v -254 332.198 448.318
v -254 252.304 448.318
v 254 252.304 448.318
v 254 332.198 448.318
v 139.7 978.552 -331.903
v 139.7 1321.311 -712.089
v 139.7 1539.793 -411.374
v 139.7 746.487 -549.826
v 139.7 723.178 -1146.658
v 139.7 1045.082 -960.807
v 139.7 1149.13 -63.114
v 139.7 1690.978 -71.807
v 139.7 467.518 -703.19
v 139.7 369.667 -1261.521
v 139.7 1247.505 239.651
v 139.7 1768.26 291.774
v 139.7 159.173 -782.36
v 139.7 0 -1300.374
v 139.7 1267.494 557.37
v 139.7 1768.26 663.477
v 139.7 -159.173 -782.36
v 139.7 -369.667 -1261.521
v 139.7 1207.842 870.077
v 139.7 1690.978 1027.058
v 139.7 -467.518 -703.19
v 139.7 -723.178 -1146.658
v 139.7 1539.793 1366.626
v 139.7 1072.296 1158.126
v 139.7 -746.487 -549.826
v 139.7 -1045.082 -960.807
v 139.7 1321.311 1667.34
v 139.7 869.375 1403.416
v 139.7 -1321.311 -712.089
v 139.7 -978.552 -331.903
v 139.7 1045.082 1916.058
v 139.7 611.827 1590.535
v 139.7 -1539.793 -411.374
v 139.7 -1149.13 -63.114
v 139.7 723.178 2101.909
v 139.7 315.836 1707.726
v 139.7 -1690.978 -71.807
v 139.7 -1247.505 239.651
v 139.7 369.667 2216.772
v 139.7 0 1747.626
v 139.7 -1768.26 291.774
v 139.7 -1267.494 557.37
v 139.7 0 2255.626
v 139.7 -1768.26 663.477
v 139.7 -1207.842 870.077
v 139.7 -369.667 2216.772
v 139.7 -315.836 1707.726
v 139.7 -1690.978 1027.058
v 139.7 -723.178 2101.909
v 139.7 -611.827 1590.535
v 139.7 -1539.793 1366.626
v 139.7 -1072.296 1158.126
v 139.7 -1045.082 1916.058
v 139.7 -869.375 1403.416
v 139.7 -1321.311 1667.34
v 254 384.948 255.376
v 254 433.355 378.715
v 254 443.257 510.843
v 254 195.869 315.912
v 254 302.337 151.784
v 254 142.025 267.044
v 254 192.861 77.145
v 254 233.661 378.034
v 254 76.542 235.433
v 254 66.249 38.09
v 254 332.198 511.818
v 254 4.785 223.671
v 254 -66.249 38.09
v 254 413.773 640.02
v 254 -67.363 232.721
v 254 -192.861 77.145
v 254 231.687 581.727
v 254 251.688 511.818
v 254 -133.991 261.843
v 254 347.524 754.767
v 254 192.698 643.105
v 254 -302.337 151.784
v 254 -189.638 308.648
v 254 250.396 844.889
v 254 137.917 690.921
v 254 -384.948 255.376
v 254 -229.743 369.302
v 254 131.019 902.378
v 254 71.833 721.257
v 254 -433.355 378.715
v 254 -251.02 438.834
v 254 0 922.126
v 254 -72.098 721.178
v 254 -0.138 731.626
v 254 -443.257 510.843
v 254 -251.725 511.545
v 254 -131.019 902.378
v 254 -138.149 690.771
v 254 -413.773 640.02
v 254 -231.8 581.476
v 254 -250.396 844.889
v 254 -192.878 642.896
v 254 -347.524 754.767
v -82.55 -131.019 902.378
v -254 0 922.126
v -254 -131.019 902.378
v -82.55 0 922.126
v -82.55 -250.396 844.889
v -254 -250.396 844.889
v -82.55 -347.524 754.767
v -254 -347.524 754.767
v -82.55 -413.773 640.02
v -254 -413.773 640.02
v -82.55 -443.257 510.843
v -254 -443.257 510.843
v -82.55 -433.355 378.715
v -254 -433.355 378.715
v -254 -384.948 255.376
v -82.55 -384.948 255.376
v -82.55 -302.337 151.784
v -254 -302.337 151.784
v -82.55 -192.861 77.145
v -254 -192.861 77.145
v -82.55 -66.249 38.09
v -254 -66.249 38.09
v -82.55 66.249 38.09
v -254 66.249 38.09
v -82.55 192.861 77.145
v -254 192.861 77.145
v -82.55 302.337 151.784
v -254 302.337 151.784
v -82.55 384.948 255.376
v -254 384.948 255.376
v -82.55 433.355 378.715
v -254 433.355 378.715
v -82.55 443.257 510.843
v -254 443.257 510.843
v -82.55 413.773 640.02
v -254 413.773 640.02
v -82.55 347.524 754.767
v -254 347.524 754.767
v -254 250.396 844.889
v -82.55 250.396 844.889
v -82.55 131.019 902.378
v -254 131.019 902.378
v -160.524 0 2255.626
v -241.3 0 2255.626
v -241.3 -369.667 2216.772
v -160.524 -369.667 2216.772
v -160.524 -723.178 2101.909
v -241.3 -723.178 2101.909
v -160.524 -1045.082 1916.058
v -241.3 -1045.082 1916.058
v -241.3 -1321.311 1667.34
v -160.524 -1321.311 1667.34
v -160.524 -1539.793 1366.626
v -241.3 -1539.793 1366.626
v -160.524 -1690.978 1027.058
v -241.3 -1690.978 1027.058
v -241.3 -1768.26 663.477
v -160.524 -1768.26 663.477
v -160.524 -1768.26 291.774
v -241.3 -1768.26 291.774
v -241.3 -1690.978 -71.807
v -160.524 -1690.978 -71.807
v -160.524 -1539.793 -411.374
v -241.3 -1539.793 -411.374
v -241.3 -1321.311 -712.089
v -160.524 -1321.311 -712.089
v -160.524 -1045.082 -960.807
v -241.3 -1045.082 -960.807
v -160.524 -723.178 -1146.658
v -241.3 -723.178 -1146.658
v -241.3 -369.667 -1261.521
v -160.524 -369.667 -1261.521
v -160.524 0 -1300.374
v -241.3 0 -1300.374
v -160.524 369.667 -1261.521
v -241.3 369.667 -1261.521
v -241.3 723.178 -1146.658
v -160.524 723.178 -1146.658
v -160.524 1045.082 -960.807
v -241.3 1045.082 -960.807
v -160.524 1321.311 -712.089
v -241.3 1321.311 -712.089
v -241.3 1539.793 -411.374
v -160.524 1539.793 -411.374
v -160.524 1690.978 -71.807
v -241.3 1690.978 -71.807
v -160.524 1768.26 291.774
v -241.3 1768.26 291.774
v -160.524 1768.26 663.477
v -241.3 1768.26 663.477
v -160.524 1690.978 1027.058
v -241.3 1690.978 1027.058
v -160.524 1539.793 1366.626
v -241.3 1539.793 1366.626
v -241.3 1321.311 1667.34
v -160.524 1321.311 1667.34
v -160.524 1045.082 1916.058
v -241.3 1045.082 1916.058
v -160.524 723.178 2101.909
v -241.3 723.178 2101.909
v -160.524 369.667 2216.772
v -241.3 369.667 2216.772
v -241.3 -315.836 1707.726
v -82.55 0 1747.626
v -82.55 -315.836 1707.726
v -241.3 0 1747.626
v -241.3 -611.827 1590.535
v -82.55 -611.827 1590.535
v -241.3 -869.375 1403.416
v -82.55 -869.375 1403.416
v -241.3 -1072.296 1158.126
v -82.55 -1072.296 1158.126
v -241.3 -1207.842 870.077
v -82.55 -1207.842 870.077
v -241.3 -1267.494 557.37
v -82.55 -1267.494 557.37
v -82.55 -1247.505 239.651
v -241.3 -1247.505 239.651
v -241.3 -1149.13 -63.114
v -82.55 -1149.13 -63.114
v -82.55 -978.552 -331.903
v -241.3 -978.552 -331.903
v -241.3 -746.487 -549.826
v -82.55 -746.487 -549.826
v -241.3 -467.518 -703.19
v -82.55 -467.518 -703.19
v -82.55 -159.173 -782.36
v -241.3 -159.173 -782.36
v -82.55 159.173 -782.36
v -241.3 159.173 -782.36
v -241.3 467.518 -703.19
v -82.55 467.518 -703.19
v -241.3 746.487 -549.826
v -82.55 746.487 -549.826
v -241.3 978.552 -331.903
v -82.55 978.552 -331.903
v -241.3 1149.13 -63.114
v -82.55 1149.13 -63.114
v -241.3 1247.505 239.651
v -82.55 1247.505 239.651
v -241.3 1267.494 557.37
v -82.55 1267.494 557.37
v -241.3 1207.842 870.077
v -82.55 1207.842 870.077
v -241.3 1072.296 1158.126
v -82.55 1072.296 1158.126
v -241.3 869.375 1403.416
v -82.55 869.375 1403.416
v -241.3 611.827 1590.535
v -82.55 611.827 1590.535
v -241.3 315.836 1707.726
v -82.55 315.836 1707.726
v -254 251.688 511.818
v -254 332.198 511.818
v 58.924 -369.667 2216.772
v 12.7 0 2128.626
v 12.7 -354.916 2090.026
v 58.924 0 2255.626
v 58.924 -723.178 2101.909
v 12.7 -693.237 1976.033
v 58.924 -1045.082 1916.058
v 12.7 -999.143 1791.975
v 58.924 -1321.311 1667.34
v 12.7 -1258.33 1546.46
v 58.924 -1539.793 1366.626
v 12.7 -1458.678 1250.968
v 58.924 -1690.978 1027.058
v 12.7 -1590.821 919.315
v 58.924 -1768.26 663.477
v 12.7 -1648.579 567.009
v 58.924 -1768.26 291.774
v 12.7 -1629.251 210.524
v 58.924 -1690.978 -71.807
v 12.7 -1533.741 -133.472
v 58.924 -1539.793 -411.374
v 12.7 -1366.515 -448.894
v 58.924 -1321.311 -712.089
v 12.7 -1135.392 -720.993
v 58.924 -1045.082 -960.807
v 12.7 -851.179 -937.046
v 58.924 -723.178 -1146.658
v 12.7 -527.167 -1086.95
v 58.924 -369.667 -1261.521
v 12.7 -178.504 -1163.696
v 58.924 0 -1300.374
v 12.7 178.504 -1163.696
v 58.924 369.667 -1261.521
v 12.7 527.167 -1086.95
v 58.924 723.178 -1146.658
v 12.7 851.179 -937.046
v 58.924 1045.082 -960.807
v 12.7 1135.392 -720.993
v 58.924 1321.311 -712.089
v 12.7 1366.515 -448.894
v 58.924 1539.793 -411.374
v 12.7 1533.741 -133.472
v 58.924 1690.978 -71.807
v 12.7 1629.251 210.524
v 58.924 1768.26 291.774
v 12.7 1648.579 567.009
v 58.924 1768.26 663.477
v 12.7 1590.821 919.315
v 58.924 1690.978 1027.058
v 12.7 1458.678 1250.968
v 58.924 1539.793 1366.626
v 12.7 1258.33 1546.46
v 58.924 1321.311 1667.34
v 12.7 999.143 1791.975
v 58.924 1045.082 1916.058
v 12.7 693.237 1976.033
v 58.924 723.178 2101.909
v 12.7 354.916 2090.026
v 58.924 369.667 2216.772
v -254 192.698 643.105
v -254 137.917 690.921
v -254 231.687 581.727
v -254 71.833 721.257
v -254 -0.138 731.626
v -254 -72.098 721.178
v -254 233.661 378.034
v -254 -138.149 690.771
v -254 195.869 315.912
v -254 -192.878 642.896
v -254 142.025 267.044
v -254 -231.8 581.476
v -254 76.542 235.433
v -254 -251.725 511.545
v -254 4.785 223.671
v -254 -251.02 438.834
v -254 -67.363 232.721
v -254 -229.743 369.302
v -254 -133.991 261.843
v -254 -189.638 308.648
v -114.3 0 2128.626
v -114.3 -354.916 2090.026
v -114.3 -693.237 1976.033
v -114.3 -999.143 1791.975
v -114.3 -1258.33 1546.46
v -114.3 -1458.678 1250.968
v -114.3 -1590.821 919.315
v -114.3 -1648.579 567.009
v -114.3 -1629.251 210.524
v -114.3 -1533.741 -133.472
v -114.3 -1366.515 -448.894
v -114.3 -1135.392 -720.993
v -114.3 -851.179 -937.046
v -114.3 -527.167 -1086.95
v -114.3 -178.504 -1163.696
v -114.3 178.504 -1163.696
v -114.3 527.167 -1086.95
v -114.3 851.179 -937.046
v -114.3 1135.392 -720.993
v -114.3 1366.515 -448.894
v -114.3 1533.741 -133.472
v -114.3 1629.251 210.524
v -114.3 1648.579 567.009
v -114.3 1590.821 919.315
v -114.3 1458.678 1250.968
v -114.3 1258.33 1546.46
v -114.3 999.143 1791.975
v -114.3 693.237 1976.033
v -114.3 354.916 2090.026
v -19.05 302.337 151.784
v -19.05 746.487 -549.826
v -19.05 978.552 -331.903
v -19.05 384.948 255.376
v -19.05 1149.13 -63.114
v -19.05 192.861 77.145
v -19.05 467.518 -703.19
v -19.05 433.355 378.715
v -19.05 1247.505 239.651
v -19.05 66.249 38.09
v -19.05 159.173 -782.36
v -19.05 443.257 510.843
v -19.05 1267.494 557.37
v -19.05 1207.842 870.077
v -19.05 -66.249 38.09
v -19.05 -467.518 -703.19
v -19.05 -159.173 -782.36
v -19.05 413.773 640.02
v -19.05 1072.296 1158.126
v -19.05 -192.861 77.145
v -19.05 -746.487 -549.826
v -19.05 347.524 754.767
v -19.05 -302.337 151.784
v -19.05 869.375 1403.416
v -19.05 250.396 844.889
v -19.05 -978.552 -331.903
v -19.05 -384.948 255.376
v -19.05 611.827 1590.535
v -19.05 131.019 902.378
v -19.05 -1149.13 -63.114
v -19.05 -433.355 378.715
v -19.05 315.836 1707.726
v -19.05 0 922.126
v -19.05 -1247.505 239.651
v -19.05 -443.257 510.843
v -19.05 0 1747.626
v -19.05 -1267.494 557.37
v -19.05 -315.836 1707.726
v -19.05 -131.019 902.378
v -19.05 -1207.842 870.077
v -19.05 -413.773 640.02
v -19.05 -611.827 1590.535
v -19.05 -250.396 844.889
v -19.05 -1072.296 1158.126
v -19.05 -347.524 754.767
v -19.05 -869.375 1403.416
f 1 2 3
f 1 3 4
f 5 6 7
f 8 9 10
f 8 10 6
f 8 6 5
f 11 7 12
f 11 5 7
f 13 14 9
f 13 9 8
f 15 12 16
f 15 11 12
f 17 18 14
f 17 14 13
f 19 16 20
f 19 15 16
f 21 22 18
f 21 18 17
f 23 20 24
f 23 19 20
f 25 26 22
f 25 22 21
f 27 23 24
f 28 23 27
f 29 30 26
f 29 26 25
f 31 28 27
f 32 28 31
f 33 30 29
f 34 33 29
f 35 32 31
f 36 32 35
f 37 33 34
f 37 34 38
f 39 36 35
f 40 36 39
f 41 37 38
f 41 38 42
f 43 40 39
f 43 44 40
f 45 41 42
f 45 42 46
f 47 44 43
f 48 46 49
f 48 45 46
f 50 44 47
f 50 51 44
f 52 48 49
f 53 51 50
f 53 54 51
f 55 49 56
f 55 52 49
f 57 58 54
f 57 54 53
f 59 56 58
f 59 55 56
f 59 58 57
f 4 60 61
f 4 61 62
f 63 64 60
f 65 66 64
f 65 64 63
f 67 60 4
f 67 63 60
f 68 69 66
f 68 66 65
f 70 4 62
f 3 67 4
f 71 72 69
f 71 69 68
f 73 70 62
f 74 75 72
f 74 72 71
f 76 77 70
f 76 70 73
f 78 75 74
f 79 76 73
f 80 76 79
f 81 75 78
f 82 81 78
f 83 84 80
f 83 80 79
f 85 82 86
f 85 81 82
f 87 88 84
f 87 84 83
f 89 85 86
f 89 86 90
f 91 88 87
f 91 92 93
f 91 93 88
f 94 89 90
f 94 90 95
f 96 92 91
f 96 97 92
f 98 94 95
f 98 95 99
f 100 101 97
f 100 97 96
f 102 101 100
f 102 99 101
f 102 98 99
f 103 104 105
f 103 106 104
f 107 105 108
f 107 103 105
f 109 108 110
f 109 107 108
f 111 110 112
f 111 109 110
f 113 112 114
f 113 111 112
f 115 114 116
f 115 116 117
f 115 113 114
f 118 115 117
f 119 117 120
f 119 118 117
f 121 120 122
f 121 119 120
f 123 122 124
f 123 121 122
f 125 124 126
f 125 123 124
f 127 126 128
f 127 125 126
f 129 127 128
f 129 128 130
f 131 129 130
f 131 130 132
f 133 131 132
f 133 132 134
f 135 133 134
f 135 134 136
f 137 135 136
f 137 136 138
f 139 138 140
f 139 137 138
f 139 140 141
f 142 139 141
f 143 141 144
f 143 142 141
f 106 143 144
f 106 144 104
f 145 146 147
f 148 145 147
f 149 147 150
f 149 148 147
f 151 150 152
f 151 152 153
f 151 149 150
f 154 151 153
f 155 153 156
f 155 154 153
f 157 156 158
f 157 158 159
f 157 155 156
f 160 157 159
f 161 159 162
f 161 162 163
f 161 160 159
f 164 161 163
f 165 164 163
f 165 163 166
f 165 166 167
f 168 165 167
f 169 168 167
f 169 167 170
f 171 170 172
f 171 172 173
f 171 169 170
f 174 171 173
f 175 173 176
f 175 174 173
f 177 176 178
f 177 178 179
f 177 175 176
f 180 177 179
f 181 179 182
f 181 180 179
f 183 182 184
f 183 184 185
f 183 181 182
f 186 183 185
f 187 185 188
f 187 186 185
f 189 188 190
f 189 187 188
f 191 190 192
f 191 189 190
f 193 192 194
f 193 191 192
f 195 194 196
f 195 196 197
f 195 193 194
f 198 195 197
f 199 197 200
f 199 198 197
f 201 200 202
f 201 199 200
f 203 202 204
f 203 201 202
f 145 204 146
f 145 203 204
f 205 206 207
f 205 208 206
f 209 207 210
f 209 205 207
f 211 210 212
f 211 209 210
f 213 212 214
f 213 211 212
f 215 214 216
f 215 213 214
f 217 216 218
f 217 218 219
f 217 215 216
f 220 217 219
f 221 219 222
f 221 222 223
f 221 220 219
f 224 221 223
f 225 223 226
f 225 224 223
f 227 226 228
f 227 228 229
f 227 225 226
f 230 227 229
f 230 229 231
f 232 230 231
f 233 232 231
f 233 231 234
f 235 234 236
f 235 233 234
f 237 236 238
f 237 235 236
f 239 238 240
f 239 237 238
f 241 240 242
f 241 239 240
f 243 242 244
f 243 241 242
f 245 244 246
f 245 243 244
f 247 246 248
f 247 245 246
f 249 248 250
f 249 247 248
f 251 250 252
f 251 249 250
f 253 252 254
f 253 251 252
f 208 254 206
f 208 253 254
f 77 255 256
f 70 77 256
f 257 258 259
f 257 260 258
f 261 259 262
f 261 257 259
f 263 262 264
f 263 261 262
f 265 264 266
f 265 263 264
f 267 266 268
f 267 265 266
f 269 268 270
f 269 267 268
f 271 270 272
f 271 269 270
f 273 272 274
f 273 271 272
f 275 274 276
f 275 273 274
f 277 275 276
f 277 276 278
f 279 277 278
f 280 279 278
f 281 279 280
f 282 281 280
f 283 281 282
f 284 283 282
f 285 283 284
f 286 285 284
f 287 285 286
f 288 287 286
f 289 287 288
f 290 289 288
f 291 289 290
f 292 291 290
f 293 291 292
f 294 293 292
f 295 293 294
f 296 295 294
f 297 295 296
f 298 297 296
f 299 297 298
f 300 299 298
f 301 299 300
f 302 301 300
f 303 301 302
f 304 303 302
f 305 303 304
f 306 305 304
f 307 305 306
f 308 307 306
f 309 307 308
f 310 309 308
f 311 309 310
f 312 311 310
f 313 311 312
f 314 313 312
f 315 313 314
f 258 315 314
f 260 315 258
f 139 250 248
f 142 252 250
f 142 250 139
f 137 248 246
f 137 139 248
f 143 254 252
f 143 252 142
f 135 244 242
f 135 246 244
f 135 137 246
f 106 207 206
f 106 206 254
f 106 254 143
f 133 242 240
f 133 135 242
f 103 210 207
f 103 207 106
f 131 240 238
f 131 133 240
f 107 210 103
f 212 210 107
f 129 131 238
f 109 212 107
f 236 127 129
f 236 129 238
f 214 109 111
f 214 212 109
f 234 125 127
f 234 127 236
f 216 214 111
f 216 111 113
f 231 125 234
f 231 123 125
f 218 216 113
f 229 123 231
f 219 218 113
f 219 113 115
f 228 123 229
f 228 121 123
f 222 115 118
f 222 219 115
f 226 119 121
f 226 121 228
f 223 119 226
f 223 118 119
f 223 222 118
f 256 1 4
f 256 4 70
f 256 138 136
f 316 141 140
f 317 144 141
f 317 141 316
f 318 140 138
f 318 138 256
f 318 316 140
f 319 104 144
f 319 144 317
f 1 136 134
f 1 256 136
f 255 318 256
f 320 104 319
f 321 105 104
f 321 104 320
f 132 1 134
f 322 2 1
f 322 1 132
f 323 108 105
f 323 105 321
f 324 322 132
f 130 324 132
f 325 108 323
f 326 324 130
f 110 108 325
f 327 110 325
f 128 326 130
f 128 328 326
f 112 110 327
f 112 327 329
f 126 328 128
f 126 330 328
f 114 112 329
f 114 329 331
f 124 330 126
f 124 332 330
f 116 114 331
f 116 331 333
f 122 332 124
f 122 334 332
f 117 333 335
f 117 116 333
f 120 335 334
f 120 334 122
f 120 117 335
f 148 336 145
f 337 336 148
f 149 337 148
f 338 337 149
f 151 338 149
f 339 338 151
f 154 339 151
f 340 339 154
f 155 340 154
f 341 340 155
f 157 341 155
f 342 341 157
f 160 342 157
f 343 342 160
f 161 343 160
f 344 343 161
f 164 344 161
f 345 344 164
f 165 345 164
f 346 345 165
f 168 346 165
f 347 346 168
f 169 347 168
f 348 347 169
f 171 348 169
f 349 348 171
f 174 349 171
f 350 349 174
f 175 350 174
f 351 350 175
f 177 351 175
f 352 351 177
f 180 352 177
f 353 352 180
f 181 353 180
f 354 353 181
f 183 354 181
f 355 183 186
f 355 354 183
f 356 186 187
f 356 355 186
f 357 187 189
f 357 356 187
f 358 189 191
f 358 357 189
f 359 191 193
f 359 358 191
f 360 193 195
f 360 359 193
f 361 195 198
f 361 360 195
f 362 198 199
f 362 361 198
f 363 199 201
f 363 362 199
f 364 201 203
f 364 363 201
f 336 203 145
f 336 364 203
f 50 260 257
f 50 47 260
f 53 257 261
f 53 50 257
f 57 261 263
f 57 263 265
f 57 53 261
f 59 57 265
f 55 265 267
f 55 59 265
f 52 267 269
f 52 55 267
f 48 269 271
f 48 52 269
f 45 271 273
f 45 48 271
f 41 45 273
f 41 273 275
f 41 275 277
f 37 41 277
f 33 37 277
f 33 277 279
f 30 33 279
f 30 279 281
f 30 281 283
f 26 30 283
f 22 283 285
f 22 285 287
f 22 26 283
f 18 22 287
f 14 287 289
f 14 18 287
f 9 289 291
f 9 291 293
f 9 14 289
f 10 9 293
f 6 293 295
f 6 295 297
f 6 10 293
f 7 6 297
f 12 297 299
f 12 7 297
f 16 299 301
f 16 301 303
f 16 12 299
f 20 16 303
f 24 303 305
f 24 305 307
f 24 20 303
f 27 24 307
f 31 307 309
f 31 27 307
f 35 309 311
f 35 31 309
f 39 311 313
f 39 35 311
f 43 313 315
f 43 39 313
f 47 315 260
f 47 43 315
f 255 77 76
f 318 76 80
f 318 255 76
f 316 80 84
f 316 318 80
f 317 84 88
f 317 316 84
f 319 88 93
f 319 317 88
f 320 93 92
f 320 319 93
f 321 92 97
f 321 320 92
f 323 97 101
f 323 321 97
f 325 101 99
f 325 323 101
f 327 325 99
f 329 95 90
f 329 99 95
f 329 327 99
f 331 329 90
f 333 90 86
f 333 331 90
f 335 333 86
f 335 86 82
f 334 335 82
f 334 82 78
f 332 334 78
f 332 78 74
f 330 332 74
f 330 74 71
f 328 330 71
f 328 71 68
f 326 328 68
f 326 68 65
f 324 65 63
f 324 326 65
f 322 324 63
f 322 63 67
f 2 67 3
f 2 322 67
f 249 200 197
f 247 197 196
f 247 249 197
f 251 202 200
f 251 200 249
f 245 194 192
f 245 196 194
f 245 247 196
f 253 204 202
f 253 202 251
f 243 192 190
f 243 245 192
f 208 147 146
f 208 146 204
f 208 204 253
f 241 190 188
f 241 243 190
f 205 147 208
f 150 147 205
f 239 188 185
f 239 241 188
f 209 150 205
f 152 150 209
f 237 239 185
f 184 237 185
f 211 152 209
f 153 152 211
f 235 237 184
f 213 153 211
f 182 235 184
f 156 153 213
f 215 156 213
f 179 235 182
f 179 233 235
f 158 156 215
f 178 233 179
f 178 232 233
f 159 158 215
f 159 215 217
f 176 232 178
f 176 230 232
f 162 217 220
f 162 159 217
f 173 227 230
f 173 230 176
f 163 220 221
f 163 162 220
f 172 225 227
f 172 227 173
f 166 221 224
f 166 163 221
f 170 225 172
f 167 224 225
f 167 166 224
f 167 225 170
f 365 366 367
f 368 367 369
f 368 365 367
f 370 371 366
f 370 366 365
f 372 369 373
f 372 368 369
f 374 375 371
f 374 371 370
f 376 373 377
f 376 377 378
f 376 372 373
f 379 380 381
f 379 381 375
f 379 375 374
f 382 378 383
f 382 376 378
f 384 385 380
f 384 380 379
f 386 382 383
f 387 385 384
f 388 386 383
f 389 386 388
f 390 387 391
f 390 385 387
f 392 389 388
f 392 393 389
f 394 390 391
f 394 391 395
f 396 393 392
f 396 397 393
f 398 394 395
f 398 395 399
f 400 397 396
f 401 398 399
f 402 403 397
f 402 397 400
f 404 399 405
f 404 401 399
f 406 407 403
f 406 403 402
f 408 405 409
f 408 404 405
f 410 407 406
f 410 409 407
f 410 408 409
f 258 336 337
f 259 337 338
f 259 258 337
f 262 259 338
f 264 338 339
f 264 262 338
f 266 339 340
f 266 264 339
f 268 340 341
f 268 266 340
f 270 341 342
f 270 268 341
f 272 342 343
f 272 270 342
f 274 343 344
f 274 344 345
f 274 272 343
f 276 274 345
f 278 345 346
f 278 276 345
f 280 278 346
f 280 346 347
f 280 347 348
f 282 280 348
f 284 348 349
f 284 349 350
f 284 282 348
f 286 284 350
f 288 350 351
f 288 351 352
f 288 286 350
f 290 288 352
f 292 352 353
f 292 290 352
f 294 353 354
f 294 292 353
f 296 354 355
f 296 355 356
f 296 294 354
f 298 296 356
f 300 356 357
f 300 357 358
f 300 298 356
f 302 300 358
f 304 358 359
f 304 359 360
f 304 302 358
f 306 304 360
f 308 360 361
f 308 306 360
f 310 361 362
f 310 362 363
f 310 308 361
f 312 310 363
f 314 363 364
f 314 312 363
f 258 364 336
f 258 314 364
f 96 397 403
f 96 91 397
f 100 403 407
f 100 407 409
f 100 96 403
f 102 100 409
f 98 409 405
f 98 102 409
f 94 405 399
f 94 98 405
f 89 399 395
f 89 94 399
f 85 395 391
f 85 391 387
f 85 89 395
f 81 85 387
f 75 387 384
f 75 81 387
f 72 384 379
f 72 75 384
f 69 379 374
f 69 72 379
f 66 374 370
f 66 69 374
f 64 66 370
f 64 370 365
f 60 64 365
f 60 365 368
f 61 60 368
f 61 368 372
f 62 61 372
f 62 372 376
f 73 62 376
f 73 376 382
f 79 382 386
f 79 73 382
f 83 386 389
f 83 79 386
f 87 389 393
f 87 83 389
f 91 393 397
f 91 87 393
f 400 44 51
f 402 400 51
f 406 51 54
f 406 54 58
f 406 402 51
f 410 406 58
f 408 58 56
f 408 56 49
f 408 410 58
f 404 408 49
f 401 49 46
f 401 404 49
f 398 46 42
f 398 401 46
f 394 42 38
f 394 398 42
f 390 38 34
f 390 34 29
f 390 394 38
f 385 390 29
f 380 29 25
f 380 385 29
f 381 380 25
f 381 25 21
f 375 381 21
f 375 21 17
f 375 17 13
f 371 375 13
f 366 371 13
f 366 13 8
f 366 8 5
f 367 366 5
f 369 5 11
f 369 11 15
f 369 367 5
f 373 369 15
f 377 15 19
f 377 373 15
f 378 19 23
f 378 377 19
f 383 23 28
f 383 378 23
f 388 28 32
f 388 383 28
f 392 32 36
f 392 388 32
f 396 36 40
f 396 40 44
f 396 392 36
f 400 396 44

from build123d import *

# Parameters (mm, degrees)
SKETCH2_W          = 63.5
SKETCH2_H          = 152.4
CUT_EXTRUDE1_DEPTH = 1270


with BuildPart() as part:
    # Sketch1 → Revolve1 (revolve)
    with BuildSketch(Plane(origin=(0, 0, 0), x_dir=(1, 0, 0), z_dir=(0, 1, 0)), mode=Mode.PRIVATE) as revolve1_sk:
        Polygon((-19.05, -33.125663276), (254, -33.125663276), (254, -223.625663276), (-254, -223.625663276), (-254, -33.125663276), (-82.55, -33.125663276), (-82.55, 792.374336724), (-241.3, 792.374336724), (-241.3, 1300.374336724), (-160.524219752, 1300.374336724), (-114.3, 1173.374336724), (12.7, 1173.374336724), (58.924219752, 1300.374336724), (139.7, 1300.374336724), (139.7, 792.374336724), (-19.05, 792.374336724), align=None)
    revolve(revolve1_sk.sketch.rotate(Axis((0, 0, 477.625663276), (1, 0, 0)), 180), axis=Axis((0, 0, 477.625663276), (1, 0, 0)))

    # Sketch2 → Cut-Extrude1 (cut)
    with BuildSketch(Plane.ZY.offset(254)):
        with Locations((480.068106278, 255.998478736)):
            Rectangle(SKETCH2_W, SKETCH2_H)
    extrude(amount=-CUT_EXTRUDE1_DEPTH, mode=Mode.SUBTRACT)


solid = part.part
